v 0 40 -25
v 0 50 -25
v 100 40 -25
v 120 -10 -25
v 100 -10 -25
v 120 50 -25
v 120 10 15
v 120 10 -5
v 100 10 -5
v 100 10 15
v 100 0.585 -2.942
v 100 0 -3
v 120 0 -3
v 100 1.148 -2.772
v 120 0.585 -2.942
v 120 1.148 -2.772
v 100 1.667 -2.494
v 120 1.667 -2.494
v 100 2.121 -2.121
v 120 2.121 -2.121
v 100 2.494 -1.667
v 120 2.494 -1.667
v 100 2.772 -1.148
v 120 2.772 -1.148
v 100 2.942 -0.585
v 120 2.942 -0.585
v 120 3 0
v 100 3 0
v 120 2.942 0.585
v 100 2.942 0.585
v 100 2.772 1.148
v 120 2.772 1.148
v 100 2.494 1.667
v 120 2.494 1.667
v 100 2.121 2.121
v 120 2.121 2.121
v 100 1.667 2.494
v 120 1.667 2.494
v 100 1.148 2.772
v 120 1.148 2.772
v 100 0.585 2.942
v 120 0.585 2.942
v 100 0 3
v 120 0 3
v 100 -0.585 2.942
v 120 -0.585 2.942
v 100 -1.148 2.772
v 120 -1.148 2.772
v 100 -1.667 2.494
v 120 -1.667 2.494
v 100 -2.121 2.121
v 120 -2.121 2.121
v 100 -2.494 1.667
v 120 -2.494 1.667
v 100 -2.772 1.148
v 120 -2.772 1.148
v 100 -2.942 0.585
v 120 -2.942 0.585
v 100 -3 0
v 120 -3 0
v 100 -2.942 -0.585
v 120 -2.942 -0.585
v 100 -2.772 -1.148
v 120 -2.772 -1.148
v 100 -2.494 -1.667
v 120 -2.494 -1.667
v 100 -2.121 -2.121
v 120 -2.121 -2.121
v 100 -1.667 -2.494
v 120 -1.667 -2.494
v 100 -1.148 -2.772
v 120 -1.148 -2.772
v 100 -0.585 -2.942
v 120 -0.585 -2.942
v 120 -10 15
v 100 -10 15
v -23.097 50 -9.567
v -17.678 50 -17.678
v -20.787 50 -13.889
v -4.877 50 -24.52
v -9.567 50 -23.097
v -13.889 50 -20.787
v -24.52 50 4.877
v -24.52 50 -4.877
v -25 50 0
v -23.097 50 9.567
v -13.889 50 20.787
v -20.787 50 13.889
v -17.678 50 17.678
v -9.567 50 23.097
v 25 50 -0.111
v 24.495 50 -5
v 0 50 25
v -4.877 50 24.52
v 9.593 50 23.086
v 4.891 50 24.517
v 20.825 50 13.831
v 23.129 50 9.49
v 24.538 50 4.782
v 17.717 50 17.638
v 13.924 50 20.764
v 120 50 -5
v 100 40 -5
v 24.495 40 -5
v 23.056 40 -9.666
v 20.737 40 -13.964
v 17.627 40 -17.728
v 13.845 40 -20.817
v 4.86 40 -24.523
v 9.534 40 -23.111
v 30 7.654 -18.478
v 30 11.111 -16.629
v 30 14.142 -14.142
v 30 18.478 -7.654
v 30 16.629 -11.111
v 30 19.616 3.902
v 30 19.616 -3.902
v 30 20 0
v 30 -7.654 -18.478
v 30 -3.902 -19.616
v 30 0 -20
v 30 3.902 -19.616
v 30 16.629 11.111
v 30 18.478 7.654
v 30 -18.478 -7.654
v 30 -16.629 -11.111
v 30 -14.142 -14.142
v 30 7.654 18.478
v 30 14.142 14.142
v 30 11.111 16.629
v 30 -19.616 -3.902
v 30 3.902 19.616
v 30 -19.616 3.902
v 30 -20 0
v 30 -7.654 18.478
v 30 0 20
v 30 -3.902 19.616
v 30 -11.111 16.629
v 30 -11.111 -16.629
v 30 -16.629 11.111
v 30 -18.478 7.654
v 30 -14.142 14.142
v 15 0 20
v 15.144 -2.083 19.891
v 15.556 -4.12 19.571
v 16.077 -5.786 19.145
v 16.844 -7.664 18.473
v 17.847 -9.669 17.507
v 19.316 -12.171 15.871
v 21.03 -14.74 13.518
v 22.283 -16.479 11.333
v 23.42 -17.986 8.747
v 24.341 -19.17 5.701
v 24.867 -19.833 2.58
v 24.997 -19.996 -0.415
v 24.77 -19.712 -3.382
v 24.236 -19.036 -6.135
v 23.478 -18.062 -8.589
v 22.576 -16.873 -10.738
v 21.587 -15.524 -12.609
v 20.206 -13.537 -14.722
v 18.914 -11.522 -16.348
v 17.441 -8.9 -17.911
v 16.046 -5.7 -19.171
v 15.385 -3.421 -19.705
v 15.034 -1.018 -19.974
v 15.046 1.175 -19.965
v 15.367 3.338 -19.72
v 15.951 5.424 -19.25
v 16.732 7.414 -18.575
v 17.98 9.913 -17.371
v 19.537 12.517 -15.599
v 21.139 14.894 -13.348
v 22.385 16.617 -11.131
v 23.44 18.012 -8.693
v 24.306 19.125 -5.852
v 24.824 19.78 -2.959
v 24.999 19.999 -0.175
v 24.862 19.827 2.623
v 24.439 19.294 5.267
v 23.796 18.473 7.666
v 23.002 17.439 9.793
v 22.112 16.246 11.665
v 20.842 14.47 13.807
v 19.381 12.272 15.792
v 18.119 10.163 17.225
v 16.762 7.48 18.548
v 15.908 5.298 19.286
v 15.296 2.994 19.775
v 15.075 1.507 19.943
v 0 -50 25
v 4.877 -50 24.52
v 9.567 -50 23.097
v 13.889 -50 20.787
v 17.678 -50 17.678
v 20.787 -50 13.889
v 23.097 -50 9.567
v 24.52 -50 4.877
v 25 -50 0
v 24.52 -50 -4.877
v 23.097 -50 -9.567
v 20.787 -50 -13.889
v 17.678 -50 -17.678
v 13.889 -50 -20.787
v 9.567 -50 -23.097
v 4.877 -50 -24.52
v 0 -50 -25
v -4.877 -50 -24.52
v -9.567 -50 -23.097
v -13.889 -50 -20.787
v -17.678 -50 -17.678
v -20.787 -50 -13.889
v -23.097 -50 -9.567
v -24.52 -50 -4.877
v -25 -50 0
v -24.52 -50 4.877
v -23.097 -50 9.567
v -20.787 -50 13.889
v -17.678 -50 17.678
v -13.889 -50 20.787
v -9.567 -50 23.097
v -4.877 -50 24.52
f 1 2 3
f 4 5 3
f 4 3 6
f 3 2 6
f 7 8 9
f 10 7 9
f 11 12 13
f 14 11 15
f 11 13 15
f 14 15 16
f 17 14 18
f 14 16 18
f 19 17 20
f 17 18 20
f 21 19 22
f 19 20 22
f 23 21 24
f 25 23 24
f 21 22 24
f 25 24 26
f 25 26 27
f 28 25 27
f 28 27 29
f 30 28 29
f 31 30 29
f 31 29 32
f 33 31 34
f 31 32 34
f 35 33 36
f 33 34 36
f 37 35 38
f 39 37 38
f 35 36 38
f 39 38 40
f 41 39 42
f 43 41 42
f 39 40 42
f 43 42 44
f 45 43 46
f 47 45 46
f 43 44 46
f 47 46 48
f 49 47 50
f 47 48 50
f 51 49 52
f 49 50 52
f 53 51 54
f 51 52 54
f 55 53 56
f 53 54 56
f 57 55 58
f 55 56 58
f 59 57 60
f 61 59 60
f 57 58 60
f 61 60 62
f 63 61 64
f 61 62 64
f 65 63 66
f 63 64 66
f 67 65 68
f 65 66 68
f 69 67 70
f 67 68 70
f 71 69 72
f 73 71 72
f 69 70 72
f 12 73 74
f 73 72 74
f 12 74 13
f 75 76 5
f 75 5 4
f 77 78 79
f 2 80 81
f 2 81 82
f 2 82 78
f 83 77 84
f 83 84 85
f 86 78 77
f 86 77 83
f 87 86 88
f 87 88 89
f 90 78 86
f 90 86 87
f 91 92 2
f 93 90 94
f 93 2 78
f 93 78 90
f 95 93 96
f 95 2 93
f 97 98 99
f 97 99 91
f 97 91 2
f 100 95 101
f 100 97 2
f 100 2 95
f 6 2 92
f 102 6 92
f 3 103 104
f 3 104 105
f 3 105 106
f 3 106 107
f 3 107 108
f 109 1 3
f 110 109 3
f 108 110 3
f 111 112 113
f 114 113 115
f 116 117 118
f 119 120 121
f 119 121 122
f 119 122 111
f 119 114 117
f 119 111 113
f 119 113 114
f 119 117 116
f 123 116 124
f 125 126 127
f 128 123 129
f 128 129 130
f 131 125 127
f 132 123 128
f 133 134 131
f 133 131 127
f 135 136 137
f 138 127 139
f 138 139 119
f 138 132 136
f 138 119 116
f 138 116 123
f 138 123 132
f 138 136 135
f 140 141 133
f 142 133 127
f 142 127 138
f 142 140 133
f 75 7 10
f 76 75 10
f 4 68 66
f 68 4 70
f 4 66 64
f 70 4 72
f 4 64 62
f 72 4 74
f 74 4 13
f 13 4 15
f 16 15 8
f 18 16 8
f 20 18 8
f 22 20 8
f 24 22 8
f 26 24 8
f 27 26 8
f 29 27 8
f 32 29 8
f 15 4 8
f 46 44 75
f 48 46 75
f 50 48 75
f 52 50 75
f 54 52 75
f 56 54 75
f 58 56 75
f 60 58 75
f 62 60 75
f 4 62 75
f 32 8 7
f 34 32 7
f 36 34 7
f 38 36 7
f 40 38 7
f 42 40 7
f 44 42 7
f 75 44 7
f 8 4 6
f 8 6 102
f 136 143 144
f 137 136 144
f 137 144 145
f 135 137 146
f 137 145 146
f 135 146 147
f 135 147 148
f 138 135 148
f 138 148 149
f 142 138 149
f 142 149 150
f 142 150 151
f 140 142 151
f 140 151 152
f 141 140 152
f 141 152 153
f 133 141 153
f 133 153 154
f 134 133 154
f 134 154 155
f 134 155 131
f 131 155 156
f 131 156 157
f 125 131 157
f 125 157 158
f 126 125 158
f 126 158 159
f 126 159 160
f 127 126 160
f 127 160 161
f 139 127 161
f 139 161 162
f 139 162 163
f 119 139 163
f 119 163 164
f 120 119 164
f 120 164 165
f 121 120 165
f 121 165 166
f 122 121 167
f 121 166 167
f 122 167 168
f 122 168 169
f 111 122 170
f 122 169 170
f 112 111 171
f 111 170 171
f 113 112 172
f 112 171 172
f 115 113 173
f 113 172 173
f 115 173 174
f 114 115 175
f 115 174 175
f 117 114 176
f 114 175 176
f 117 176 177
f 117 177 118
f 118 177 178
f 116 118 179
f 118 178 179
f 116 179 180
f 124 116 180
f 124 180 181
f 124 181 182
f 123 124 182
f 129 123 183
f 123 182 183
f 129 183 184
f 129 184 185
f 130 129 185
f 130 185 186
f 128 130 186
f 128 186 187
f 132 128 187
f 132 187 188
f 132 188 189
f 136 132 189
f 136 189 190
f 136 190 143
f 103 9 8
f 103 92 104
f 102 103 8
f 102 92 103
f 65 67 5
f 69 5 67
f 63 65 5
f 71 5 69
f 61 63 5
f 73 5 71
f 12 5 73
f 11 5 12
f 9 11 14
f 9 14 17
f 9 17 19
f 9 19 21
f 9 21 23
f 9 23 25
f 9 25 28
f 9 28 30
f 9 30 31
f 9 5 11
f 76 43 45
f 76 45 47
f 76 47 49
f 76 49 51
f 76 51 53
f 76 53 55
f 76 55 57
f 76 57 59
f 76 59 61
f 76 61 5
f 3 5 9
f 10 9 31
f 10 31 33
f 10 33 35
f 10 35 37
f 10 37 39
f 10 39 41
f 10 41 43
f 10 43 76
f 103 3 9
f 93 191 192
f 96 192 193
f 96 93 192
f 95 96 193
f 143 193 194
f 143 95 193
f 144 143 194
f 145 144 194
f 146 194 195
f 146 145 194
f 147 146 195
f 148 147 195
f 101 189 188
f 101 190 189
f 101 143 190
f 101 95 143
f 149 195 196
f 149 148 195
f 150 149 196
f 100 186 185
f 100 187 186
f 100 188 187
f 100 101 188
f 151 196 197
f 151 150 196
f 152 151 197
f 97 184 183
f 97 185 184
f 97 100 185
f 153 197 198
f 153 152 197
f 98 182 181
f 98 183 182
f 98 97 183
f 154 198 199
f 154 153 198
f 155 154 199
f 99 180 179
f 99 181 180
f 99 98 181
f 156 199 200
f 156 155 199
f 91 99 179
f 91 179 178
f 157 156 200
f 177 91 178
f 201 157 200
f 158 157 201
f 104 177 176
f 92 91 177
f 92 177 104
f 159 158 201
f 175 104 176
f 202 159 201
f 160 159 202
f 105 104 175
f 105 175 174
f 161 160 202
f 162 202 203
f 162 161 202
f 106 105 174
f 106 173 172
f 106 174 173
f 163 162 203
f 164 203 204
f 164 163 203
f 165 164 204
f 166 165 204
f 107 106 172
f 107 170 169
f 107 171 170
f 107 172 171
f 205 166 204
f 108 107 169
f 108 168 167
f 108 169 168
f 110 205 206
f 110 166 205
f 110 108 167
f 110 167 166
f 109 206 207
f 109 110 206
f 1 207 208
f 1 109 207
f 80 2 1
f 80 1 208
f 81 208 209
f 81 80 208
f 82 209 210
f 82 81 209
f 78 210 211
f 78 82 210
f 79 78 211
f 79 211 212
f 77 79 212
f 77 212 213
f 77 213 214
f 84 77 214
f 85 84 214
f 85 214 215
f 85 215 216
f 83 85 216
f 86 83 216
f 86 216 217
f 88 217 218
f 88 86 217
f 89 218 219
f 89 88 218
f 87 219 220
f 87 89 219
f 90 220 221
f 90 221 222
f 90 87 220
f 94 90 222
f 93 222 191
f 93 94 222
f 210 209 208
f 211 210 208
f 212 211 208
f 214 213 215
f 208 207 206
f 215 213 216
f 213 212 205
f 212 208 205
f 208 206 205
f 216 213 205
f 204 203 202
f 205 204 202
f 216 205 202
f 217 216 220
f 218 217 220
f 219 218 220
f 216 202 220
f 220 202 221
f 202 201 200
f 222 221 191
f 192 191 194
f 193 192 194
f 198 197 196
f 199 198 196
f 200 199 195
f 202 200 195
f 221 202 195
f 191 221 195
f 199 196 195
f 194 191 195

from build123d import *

# Parameters (mm, degrees)
SKETCH1_R           = 25
BOSS_EXTRUDE1_DEPTH = 50
SKETCH2_R           = 20
BOSS_EXTRUDE2_DEPTH = 30
SKETCH3_W           = 20
SKETCH3_H           = 10
BOSS_EXTRUDE3_DEPTH = 120
SKETCH4_W           = 20
SKETCH4_H           = 20
BOSS_EXTRUDE4_DEPTH = 50
SKETCH5_W           = 20
SKETCH5_H           = 20
BOSS_EXTRUDE5_DEPTH = 40
SKETCH6_R           = 3
CUT_EXTRUDE1_DEPTH  = 20


with BuildPart() as part:
    # Sketch1 → Boss-Extrude1 (new, symmetric)
    with BuildSketch(Plane(origin=(0, 0, 0), x_dir=(1, 0, 0), z_dir=(0, 1, 0))):
        with Locations(Location((0, 0, 0), (0, 0, 270))):
            Circle(SKETCH1_R)
    extrude(amount=BOSS_EXTRUDE1_DEPTH, both=True)

    # Sketch2 → Boss-Extrude2 (add)
    with BuildSketch(Plane(origin=(0, 0, 0), x_dir=(0, 0, -1), z_dir=(1, 0, 0))):
        with Locations(Location((0, 0, 0), (0, 0, 180))):
            Circle(SKETCH2_R)
    extrude(amount=BOSS_EXTRUDE2_DEPTH)

    # Sketch3 → Boss-Extrude3 (add)
    with BuildSketch(Plane(origin=(0, 0, 0), x_dir=(0, 0, -1), z_dir=(1, 0, 0))):
        with Locations((15, 45)):
            Rectangle(SKETCH3_W, SKETCH3_H)
    extrude(amount=BOSS_EXTRUDE3_DEPTH)

    # Sketch4 → Boss-Extrude4 (add)
    with BuildSketch(Plane.XZ.offset(-40)):
        with Locations((110, -15)):
            Rectangle(SKETCH4_W, SKETCH4_H)
    extrude(amount=BOSS_EXTRUDE4_DEPTH)

    # Sketch5 → Boss-Extrude5 (add)
    with BuildSketch(Plane(origin=(0, 0, -25), x_dir=(-1, 0, 0), z_dir=(0, 0, -1))):
        with Locations((-110, 0)):
            Rectangle(SKETCH5_W, SKETCH5_H)
    extrude(amount=-BOSS_EXTRUDE5_DEPTH)

    # Sketch6 → Cut-Extrude1 (cut)
    with BuildSketch(Plane(origin=(120, 0, 0), x_dir=(0, 0, -1), z_dir=(1, 0, 0))):
        Circle(SKETCH6_R)
    extrude(amount=-CUT_EXTRUDE1_DEPTH, mode=Mode.SUBTRACT)


solid = part.part
